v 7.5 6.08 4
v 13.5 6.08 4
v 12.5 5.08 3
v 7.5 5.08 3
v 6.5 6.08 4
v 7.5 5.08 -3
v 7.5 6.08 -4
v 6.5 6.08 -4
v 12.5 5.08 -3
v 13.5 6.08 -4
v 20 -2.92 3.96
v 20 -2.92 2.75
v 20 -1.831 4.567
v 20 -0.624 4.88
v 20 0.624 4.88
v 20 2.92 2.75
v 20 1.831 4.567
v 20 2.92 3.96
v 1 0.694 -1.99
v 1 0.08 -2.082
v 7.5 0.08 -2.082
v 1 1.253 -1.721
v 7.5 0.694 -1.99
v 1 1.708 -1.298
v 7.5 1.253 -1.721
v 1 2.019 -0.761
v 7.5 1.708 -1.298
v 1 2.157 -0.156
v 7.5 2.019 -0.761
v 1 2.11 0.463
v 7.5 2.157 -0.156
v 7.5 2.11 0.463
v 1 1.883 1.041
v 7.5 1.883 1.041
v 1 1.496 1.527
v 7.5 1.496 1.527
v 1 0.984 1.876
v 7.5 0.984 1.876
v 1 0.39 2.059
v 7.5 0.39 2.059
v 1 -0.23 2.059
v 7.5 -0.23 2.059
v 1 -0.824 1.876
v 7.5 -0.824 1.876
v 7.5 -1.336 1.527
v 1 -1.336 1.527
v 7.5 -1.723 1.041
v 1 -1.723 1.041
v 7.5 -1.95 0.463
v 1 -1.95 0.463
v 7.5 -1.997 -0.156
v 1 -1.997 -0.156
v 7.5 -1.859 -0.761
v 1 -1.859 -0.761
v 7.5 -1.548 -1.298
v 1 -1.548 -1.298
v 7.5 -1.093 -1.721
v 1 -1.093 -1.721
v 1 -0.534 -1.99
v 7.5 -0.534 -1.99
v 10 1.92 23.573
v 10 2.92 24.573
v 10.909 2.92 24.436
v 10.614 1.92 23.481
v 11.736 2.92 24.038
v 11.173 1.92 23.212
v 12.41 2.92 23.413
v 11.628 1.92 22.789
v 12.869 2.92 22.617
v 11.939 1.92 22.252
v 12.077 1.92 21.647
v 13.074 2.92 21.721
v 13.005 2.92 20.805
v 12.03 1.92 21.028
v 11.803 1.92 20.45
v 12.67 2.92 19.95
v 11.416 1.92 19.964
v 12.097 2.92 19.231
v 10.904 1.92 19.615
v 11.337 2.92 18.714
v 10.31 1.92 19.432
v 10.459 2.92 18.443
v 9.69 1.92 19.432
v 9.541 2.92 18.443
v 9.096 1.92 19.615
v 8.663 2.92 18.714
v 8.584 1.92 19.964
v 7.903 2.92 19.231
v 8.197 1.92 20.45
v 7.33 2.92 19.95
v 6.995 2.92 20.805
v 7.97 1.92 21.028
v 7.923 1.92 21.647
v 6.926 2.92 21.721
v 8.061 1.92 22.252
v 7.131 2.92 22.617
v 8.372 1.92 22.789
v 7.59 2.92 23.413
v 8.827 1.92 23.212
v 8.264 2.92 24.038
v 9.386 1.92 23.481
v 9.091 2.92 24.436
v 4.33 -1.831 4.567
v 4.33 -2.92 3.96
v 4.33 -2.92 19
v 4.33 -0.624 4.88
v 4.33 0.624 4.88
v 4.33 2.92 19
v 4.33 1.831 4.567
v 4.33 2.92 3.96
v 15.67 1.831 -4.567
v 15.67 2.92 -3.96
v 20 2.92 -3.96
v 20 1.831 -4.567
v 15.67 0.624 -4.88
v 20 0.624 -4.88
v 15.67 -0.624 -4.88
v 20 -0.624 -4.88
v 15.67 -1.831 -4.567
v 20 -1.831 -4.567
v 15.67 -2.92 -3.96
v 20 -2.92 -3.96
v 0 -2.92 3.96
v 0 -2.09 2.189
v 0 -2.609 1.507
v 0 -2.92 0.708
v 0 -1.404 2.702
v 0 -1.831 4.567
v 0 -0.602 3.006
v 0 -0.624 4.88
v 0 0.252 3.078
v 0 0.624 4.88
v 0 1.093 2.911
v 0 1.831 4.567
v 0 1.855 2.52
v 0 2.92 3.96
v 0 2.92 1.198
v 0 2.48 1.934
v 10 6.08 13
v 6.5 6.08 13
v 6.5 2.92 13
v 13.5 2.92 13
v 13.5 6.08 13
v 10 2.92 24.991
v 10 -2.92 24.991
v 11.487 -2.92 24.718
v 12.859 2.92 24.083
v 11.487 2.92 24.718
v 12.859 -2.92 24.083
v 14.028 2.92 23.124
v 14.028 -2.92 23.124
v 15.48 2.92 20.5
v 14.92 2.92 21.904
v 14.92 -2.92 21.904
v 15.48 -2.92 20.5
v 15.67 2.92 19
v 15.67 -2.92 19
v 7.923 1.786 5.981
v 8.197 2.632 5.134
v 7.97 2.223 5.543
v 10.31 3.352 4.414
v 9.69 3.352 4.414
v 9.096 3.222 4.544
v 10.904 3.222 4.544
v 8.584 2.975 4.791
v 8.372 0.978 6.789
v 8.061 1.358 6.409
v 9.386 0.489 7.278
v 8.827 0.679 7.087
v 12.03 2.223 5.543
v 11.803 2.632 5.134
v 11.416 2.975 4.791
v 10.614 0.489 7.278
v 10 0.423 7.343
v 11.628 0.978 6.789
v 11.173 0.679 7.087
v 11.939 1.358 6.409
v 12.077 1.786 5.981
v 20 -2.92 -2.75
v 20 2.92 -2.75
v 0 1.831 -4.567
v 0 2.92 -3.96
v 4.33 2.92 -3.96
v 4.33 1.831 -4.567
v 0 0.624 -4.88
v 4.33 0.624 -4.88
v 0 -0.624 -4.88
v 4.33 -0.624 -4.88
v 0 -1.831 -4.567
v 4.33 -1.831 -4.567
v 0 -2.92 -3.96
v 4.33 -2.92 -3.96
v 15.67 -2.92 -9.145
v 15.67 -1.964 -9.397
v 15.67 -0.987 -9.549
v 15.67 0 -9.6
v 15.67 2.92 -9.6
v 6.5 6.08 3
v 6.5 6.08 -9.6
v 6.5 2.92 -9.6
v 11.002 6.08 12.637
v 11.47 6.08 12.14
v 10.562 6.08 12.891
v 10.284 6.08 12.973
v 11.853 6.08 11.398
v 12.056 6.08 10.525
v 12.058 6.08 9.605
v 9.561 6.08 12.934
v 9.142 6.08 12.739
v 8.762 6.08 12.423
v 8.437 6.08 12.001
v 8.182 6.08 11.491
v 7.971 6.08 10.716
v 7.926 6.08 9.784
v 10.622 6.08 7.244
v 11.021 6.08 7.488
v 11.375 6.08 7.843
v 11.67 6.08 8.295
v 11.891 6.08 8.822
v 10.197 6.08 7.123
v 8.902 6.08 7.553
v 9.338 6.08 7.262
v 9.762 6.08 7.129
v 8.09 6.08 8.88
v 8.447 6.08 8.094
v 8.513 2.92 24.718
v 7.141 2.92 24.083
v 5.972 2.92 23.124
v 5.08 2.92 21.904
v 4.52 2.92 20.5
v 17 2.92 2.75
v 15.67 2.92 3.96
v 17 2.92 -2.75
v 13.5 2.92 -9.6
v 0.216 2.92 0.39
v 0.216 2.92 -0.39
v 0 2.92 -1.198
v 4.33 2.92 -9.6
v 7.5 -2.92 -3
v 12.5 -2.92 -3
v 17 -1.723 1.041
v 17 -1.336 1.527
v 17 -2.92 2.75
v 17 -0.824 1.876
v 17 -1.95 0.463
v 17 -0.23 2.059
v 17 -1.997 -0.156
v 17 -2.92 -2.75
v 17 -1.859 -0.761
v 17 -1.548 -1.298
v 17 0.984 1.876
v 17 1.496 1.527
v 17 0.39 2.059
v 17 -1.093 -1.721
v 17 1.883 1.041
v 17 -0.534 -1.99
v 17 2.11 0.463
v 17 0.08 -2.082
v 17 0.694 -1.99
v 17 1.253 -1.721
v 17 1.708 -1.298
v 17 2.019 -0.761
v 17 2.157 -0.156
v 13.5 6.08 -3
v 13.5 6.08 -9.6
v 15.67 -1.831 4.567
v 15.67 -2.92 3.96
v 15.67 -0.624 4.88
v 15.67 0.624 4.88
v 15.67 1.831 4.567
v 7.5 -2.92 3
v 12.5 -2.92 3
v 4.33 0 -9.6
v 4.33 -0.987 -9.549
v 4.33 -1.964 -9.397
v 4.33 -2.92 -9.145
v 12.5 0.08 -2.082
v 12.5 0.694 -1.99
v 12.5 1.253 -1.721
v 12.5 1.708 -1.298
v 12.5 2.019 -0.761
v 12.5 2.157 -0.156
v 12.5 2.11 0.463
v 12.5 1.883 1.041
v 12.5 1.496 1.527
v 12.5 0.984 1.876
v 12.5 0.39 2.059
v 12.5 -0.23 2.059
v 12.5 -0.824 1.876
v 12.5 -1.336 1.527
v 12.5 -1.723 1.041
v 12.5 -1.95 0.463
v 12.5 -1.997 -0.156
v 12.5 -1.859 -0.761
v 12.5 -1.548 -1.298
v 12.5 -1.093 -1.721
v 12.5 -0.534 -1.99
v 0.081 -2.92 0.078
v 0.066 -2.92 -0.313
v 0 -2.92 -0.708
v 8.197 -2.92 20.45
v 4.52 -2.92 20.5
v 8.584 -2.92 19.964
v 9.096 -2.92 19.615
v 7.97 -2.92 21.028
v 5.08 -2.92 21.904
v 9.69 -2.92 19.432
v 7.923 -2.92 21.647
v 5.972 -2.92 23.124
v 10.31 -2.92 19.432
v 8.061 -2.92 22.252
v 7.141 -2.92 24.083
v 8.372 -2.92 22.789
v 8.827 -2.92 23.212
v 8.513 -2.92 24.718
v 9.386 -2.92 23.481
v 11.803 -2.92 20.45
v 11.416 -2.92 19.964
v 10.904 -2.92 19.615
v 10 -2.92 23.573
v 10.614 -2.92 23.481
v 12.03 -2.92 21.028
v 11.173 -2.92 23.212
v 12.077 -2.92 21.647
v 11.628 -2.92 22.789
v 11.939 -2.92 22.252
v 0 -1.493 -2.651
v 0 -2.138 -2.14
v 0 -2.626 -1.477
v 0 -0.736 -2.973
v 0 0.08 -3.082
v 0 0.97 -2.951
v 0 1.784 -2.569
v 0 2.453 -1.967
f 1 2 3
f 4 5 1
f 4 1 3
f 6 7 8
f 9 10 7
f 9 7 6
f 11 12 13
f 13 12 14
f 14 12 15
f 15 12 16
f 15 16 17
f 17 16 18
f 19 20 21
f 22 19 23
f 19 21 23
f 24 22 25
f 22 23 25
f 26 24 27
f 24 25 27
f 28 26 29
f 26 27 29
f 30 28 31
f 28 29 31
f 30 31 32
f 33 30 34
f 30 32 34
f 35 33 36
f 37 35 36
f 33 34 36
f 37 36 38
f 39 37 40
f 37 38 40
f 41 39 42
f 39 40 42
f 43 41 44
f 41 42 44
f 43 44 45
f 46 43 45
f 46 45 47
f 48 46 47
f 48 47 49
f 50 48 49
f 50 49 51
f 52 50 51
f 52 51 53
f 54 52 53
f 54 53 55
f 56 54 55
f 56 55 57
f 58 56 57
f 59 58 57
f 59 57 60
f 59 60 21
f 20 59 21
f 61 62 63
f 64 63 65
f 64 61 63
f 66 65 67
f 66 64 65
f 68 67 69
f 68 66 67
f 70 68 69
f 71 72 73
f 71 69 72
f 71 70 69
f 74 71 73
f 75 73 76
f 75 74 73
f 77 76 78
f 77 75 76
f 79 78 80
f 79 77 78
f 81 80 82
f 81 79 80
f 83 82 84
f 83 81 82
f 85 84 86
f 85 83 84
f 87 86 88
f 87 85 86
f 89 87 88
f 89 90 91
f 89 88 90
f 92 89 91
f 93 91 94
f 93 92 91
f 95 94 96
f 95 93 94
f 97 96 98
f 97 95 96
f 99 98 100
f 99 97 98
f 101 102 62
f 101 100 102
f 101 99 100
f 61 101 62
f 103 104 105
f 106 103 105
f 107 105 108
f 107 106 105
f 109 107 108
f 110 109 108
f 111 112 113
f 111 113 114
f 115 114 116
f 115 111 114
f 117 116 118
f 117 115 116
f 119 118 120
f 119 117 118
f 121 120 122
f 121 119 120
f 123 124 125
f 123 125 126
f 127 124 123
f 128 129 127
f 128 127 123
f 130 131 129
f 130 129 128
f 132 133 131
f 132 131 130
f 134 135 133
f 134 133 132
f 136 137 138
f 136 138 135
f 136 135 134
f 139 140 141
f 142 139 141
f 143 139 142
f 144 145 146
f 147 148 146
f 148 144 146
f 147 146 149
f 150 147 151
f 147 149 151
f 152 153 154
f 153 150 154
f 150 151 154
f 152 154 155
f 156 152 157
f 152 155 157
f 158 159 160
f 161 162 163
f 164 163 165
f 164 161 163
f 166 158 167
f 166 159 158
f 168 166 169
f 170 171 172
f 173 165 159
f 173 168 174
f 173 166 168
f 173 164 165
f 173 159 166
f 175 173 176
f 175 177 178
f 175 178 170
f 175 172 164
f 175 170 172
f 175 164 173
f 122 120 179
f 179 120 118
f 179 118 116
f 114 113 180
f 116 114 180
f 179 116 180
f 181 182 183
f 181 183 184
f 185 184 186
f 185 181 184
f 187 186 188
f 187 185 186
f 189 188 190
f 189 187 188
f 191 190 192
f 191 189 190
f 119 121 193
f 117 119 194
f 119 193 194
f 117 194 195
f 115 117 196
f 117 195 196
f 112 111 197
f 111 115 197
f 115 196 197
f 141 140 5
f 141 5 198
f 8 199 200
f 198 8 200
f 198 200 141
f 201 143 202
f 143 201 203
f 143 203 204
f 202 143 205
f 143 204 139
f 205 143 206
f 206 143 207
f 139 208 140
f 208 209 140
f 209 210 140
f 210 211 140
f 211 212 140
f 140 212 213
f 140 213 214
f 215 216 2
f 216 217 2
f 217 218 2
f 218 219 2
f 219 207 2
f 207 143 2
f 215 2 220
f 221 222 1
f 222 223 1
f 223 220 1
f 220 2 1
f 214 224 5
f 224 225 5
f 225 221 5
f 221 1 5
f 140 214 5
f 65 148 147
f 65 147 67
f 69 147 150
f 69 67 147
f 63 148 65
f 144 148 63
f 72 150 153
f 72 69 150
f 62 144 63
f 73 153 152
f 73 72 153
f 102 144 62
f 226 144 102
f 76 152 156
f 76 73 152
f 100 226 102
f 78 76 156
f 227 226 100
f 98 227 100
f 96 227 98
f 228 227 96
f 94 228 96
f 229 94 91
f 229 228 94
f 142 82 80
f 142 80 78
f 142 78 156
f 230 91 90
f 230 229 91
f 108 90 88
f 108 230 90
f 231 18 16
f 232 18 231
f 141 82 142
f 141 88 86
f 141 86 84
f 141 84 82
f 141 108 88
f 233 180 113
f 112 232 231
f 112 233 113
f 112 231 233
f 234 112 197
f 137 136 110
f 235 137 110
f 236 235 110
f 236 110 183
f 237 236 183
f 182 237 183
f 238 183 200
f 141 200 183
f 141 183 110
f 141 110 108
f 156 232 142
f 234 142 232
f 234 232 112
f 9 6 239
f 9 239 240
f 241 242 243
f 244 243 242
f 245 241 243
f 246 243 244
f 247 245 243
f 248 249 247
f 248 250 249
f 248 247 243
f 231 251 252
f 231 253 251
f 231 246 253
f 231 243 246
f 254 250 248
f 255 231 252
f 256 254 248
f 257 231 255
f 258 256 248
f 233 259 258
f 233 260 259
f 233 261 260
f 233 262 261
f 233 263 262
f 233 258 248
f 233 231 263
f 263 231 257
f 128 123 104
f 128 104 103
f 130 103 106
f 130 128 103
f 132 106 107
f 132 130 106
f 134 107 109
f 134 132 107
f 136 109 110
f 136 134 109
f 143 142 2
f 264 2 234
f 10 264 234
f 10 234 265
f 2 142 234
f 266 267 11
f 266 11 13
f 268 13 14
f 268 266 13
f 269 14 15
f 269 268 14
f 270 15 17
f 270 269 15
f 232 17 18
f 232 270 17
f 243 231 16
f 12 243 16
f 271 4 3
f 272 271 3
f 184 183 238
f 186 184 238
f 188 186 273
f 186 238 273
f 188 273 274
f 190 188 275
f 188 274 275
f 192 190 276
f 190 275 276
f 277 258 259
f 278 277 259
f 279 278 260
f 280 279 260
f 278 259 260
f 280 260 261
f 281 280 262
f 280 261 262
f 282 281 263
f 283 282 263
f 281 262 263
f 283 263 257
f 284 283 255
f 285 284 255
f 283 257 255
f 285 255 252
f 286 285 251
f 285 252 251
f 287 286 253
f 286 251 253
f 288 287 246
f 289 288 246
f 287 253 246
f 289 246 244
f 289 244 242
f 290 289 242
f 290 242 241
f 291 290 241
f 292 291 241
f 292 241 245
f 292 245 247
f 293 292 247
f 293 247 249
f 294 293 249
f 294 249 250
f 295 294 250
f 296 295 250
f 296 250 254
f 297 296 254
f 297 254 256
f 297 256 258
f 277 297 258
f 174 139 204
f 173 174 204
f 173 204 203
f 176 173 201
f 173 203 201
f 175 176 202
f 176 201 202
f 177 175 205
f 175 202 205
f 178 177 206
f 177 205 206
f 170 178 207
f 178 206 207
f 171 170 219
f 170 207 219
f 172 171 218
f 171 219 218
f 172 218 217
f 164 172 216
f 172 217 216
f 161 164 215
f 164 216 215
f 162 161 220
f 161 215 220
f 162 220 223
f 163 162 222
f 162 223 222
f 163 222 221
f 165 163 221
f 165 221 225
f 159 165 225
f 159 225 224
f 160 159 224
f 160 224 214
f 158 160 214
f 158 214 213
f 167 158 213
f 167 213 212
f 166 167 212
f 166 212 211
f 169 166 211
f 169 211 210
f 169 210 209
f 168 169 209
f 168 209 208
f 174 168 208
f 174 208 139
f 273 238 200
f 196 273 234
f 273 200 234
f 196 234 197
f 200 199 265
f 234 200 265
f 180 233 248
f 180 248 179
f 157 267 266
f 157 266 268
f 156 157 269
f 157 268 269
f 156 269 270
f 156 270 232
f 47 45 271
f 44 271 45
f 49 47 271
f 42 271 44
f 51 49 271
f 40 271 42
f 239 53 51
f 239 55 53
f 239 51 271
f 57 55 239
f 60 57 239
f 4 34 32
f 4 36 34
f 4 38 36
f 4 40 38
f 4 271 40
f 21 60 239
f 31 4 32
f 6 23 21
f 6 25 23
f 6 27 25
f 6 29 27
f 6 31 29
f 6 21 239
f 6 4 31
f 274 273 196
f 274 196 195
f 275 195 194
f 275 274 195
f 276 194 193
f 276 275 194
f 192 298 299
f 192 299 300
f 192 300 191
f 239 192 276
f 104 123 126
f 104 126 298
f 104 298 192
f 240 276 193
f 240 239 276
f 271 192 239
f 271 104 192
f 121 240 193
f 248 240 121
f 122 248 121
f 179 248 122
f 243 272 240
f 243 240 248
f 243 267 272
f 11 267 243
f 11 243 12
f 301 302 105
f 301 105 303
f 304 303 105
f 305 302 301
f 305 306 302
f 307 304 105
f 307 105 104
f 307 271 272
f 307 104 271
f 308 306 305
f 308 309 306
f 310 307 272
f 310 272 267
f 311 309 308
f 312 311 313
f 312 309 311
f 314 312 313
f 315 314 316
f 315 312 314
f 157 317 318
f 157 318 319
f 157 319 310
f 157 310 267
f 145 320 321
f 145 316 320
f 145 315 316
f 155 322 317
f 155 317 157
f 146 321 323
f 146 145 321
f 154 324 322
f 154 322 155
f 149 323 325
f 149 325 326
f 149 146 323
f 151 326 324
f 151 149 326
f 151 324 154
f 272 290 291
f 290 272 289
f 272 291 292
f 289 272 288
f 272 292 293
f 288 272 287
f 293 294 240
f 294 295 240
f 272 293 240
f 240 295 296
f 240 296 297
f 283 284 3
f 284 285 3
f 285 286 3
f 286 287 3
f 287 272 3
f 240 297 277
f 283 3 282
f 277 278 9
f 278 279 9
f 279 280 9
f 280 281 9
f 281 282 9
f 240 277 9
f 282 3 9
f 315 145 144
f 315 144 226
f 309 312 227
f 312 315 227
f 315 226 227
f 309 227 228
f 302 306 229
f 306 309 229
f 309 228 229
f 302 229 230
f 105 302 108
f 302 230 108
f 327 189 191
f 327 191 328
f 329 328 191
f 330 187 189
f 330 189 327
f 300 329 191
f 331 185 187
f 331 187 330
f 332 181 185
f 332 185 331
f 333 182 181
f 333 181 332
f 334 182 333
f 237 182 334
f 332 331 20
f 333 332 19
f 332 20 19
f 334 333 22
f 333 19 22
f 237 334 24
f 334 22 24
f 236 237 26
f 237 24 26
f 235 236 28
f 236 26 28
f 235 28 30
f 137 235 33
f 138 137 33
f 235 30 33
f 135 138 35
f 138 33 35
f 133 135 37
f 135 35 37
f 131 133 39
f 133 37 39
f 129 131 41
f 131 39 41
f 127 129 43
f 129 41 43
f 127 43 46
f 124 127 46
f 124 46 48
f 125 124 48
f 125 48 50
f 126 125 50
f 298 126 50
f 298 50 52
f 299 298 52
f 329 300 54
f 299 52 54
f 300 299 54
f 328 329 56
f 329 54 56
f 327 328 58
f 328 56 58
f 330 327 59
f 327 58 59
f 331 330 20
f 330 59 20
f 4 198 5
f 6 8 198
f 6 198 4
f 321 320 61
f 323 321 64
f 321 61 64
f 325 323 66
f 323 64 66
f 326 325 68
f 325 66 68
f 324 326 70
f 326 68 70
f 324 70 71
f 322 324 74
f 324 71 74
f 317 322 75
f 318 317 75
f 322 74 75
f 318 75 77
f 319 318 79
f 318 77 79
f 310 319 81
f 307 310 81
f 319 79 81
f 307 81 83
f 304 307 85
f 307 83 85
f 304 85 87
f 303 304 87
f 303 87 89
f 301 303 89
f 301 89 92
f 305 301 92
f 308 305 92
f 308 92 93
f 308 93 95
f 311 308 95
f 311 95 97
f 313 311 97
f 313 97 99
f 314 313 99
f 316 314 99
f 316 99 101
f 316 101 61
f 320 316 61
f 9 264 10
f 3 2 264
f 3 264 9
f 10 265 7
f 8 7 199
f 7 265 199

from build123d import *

# Parameters (mm, degrees)
BOSS_EXTRUDE1_DEPTH      = 20
SKETCH3_W                = 11.34
SKETCH3_H                = 5.84
BOSS_EXTRUDE2_DEPTH      = 25
FILLET1_R                = 6
SKETCH4_W                = 7
SKETCH4_H                = 8
BOSS_EXTRUDE3_DEPTH      = 9
BOSS_EXTRUDE4_DEPTH      = 13
BOSS_EXTRUDE4_DEPTH_BACK = 9.6
SKETCH5_W                = 5
SKETCH5_H                = 6
CUT_EXTRUDE1_DEPTH       = 9
SKETCH6_R                = 2.0825
CUT_EXTRUDE2_DEPTH       = 5.84
CUT_EXTRUDE3_REACH       = 34.581
SKETCH8_R                = 2.0825
SKETCH9_W                = 3
SKETCH9_H                = 5.5
CUT_EXTRUDE4_DEPTH       = 5.84
CUT_EXTRUDE5_DEPTH       = 11.34
SKETCH13_R               = 2.0825
CUT_EXTRUDE7_DEPTH       = 8


with BuildPart() as part:
    # Sketch2 → Boss-Extrude1 (new body)
    with BuildSketch(Plane(origin=(0, 0, 0), x_dir=(0, 0, -1), z_dir=(1, 0, 0))):
        with BuildLine():
            ThreePointArc((3.959797975, 2.92), (4.92, 0), (3.959797975, -2.92))
            Line((3.959797975, -2.92), (-3.959797975, -2.92))
            ThreePointArc((-3.959797975, -2.92), (-4.92, 0), (-3.959797975, 2.92))
            Line((-3.959797975, 2.92), (3.959797975, 2.92))
        make_face()
    extrude(amount=BOSS_EXTRUDE1_DEPTH)

    # Sketch3 → Boss-Extrude2 (add)
    with BuildSketch(Plane.XY):
        with Locations((10, 0)):
            Rectangle(SKETCH3_W, SKETCH3_H)
    extrude(amount=BOSS_EXTRUDE2_DEPTH)

    # Fillet1
    # the kernel refuses this fillet: 6 mm, written as the material it takes off along each edge
    with BuildSketch(Plane(origin=(15.67, -17.92, 25), x_dir=(0, 0, -1), z_dir=(0, 1, 0)), Plane(origin=(4.33, 17.92, 25), x_dir=(0, 0, -1), z_dir=(0, -1, 0))) as fillet1_piece_1:
        with BuildLine():
            CenterArc((FILLET1_R, FILLET1_R), FILLET1_R, 180, 90)
            Line((0, FILLET1_R), (0, 0))
            Line((0, 0), (FILLET1_R, 0))
        make_face()
    extrude(amount=35.84, mode=Mode.SUBTRACT)

    # Sketch4 → Boss-Extrude3 (add)
    with BuildSketch(Plane.XZ.offset(2.92)):
        with Locations((10, 0.040202025)):
            Rectangle(SKETCH4_W, SKETCH4_H)
    extrude(amount=-BOSS_EXTRUDE3_DEPTH)

    # Sketch10 → Boss-Extrude4 (add, two sides: drawn at the far end of the back side and taken through both)
    with BuildSketch(Plane.XY.offset(-BOSS_EXTRUDE4_DEPTH_BACK)):
        Polygon((10, -2.92), (15.67, -2.92), (15.67, 2.92), (13.5, 2.92), (13.5, 6.08), (6.5, 6.08), (6.5, 2.92), (4.33, 2.92), (4.33, -2.92), align=None)
    extrude(amount=BOSS_EXTRUDE4_DEPTH + BOSS_EXTRUDE4_DEPTH_BACK)

    # Sketch5 → Cut-Extrude1 (cut)
    with BuildSketch(Plane(origin=(0, 6.08, 0), x_dir=(1, 0, 0), z_dir=(0, 1, 0))):
        with Locations((10, 0)):
            Rectangle(SKETCH5_W, SKETCH5_H)
    extrude(amount=-CUT_EXTRUDE1_DEPTH, mode=Mode.SUBTRACT)

    # Sketch6 → Cut-Extrude2 (cut)
    with BuildSketch(Plane(origin=(0, 2.92, 0), x_dir=(1, 0, 0), z_dir=(0, 1, 0))):
        with Locations(Location((10, -21.490918127, 0), (0, 0, 270))):
            Circle(SKETCH6_R)
    extrude(amount=-CUT_EXTRUDE2_DEPTH, mode=Mode.SUBTRACT)

    # Cut-Extrude3: up to this face of the body (flat: up to its plane)
    cut_extrude3_end = Plane(part.part.faces().sort_by_distance((0, 0, 0))[0])
    # Sketch8 → Cut-Extrude3 (cut, up to the picked face)
    with BuildSketch(Plane(origin=(20, 0, 0), x_dir=(0, 0, -1), z_dir=(1, 0, 0)), mode=Mode.PRIVATE) as cut_extrude3_sk1:
        with Locations((0, 0.08)):
            Circle(SKETCH8_R)
    cut_extrude3_tool1 = split(extrude(cut_extrude3_sk1.sketch, amount=-CUT_EXTRUDE3_REACH, mode=Mode.PRIVATE), bisect_by=cut_extrude3_end, keep=Keep.BOTH, mode=Mode.PRIVATE)
    add(cut_extrude3_tool1.solids().sort_by(Axis((20, 0.08, 0), (-1, 0, 0)))[0], mode=Mode.SUBTRACT)

    # Sketch9 → Cut-Extrude4 (cut)
    with BuildSketch(Plane(origin=(0, 2.92, 0), x_dir=(1, 0, 0), z_dir=(0, 1, 0))):
        with Locations((18.5, 0)):
            Rectangle(SKETCH9_W, SKETCH9_H)
    extrude(amount=-CUT_EXTRUDE4_DEPTH, mode=Mode.SUBTRACT)

    # Chamfer1
    # the kernel refuses this chamfer: 1 mm, written as the material it takes off along each edge
    with BuildSketch(Plane(origin=(12.5, 6.08, 3), x_dir=(0.9996219169112968, 0.027495876610587375, 0), z_dir=(0, 0, -1)), Plane(origin=(7.5, 6.08, -3), x_dir=(-0.9996219169112968, 0.02749587661058735, 0), z_dir=(0, 0, 1))) as chamfer1_piece_1:
        with BuildLine():
            Line((1.028673195, 0), (-0.056547155, 1.027117794))
            Line((-0.056547155, 1.027117794), (-0.076539593, 1.026567876))
            ThreePointArc((-0.076539593, 1.026567876), (-0.034129227, 0.51339783), (-0.019992438, -0.000549918))
            Line((-0.019992438, -0.000549918), (0.000549918, -0.019992438))
            ThreePointArc((0.000549918, -0.019992438), (0.514497665, -0.00585565), (1.029223113, -0.019992438))
            Line((1.029223113, -0.019992438), (1.028673195, 0))
        make_face()
    extrude(amount=6, mode=Mode.SUBTRACT)
    with BuildSketch(Plane(origin=(12.5, 6.08, -3), x_dir=(0, 0.02749587661058736, -0.9996219169112968), z_dir=(-1, 0, 0)), Plane(origin=(7.5, 6.08, 3), x_dir=(0, 0.02749587661058736, 0.9996219169112968), z_dir=(1, 0, 0))) as chamfer1_piece_2:
        with BuildLine():
            Line((1.028673195, 0), (-0.056547155, 1.027117794))
            Line((-0.056547155, 1.027117794), (-0.076539593, 1.026567876))
            ThreePointArc((-0.076539593, 1.026567876), (-0.034129227, 0.51339783), (-0.019992438, -0.000549918))
            Line((-0.019992438, -0.000549918), (0.000549918, -0.019992438))
            ThreePointArc((0.000549918, -0.019992438), (0.514497665, -0.00585565), (1.029223113, -0.019992438))
            Line((1.029223113, -0.019992438), (1.028673195, 0))
        make_face()
    extrude(amount=5, mode=Mode.SUBTRACT)
    with BuildSketch(Plane(origin=(10, 2.92, 21.490918127), x_dir=(0, 0, 1), z_dir=(-1, 0, 0))) as chamfer1_piece_3:
        with BuildLine():
            Line((3.110784271, 0.028284271), (2.054215729, -1.028284271))
            Line((2.054215729, -1.028284271), (2.034215729, -1.028284271))
            ThreePointArc((2.034215729, -1.028284271), (2.0625, -0.514142136), (2.0625, 0))
            Line((2.0625, 0), (2.0825, 0.02))
            ThreePointArc((2.0825, 0.02), (2.596642136, 0.02), (3.110784271, 0.048284271))
            Line((3.110784271, 0.048284271), (3.110784271, 0.028284271))
        make_face()
    revolve(axis=Axis((10, 2.92, 21.490918127), (0, 1, 0)), mode=Mode.SUBTRACT)
    with BuildSketch(Plane(origin=(0, 0.08, 0), x_dir=(0, 0, -1), z_dir=(0, -1, 0))) as chamfer1_piece_4:
        with BuildLine():
            Line((3.110784271, -0.028284271), (2.054215729, 1.028284271))
            Line((2.054215729, 1.028284271), (2.034215729, 1.028284271))
            ThreePointArc((2.034215729, 1.028284271), (2.0625, 0.514142136), (2.0625, 0))
            Line((2.0625, 0), (2.0825, -0.02))
            ThreePointArc((2.0825, -0.02), (2.596642136, -0.02), (3.110784271, -0.048284271))
            Line((3.110784271, -0.048284271), (3.110784271, -0.028284271))
        make_face()
    revolve(axis=Axis((0, 0.08, 0), (1, 0, 0)), mode=Mode.SUBTRACT)
    with BuildSketch(Plane(origin=(12.5, 6.08, 5.571682988), x_dir=(0.9996219169112968, 0.02749587661058651, 0), z_dir=(0, 0, -1))) as chamfer1_piece_5a_section:
        with BuildLine():
            Line((1.028673195, 0), (-0.056547155, 1.027117794))
            Line((-0.056547155, 1.027117794), (-0.076539593, 1.026567876))
            ThreePointArc((-0.076539593, 1.026567876), (-0.034129227, 0.51339783), (-0.019992438, -0.000549918))
            Line((-0.019992438, -0.000549918), (0.000549918, -0.019992438))
            ThreePointArc((0.000549918, -0.019992438), (0.514497665, -0.00585565), (1.029223113, -0.019992438))
            Line((1.029223113, -0.019992438), (1.028673195, 0))
        make_face()
    chamfer1_piece_5a = extrude(amount=8.571682988, mode=Mode.PRIVATE)
    chamfer1_piece_5a = split(chamfer1_piece_5a, bisect_by=Plane(origin=(12.829793627, 5.750206373, 3), z_dir=(0, 0, 1)), keep=Keep.TOP, mode=Mode.PRIVATE)
    with BuildSketch(Plane(origin=(7.5, 6.08, 3), x_dir=(0, 0.02749587661058736, 0.9996219169112968), z_dir=(1, 0, 0))) as chamfer1_piece_5b_section:
        with BuildLine():
            Line((1.028673195, 0), (-0.056547155, 1.027117794))
            Line((-0.056547155, 1.027117794), (-0.076539593, 1.026567876))
            ThreePointArc((-0.076539593, 1.026567876), (-0.034129227, 0.51339783), (-0.019992438, -0.000549918))
            Line((-0.019992438, -0.000549918), (0.000549918, -0.019992438))
            ThreePointArc((0.000549918, -0.019992438), (0.514497665, -0.00585565), (1.029223113, -0.019992438))
            Line((1.029223113, -0.019992438), (1.028673195, 0))
        make_face()
    chamfer1_piece_5b = extrude(amount=7.571682988, mode=Mode.PRIVATE)
    chamfer1_piece_5b = split(chamfer1_piece_5b, bisect_by=Plane(origin=(12.5, 5.750206373, 3.329793627), z_dir=(1, 0, 0)), keep=Keep.TOP, mode=Mode.PRIVATE)
    chamfer1_piece_5 = chamfer1_piece_5a & chamfer1_piece_5b
    add(chamfer1_piece_5, mode=Mode.SUBTRACT)
    with BuildSketch(Plane(origin=(15.071682988, 6.08, -3), x_dir=(0, 0.027495876610586497, -0.9996219169112968), z_dir=(-1, 0, 0))) as chamfer1_piece_6a_section:
        with BuildLine():
            Line((1.028673195, 0), (-0.056547155, 1.027117794))
            Line((-0.056547155, 1.027117794), (-0.076539593, 1.026567876))
            ThreePointArc((-0.076539593, 1.026567876), (-0.034129227, 0.51339783), (-0.019992438, -0.000549918))
            Line((-0.019992438, -0.000549918), (0.000549918, -0.019992438))
            ThreePointArc((0.000549918, -0.019992438), (0.514497665, -0.00585565), (1.029223113, -0.019992438))
            Line((1.029223113, -0.019992438), (1.028673195, 0))
        make_face()
    chamfer1_piece_6a = extrude(amount=7.571682988, mode=Mode.PRIVATE)
    chamfer1_piece_6a = split(chamfer1_piece_6a, bisect_by=Plane(origin=(12.5, 5.750206373, -3.329793627), z_dir=(1, 0, 0)), keep=Keep.TOP, mode=Mode.PRIVATE)
    with BuildSketch(Plane(origin=(12.5, 6.08, 3), x_dir=(0.9996219169112968, 0.027495876610587375, 0), z_dir=(0, 0, -1))) as chamfer1_piece_6b_section:
        with BuildLine():
            Line((1.028673195, 0), (-0.056547155, 1.027117794))
            Line((-0.056547155, 1.027117794), (-0.076539593, 1.026567876))
            ThreePointArc((-0.076539593, 1.026567876), (-0.034129227, 0.51339783), (-0.019992438, -0.000549918))
            Line((-0.019992438, -0.000549918), (0.000549918, -0.019992438))
            ThreePointArc((0.000549918, -0.019992438), (0.514497665, -0.00585565), (1.029223113, -0.019992438))
            Line((1.029223113, -0.019992438), (1.028673195, 0))
        make_face()
    chamfer1_piece_6b = extrude(amount=8.571682988, mode=Mode.PRIVATE)
    chamfer1_piece_6b = split(chamfer1_piece_6b, bisect_by=Plane(origin=(12.829793627, 5.750206373, -3), z_dir=(0, 0, -1)), keep=Keep.TOP, mode=Mode.PRIVATE)
    chamfer1_piece_6 = chamfer1_piece_6a & chamfer1_piece_6b
    add(chamfer1_piece_6, mode=Mode.SUBTRACT)
    with BuildSketch(Plane(origin=(7.5, 6.08, -5.571682988), x_dir=(-0.9996219169112968, 0.027495876610586487, 0), z_dir=(0, 0, 1))) as chamfer1_piece_7a_section:
        with BuildLine():
            Line((1.028673195, 0), (-0.056547155, 1.027117794))
            Line((-0.056547155, 1.027117794), (-0.076539593, 1.026567876))
            ThreePointArc((-0.076539593, 1.026567876), (-0.034129227, 0.51339783), (-0.019992438, -0.000549918))
            Line((-0.019992438, -0.000549918), (0.000549918, -0.019992438))
            ThreePointArc((0.000549918, -0.019992438), (0.514497665, -0.00585565), (1.029223113, -0.019992438))
            Line((1.029223113, -0.019992438), (1.028673195, 0))
        make_face()
    chamfer1_piece_7a = extrude(amount=8.571682988, mode=Mode.PRIVATE)
    chamfer1_piece_7a = split(chamfer1_piece_7a, bisect_by=Plane(origin=(7.170206373, 5.750206373, -3), z_dir=(0, 0, -1)), keep=Keep.TOP, mode=Mode.PRIVATE)
    with BuildSketch(Plane(origin=(12.5, 6.08, -3), x_dir=(0, 0.02749587661058736, -0.9996219169112968), z_dir=(-1, 0, 0))) as chamfer1_piece_7b_section:
        with BuildLine():
            Line((1.028673195, 0), (-0.056547155, 1.027117794))
            Line((-0.056547155, 1.027117794), (-0.076539593, 1.026567876))
            ThreePointArc((-0.076539593, 1.026567876), (-0.034129227, 0.51339783), (-0.019992438, -0.000549918))
            Line((-0.019992438, -0.000549918), (0.000549918, -0.019992438))
            ThreePointArc((0.000549918, -0.019992438), (0.514497665, -0.00585565), (1.029223113, -0.019992438))
            Line((1.029223113, -0.019992438), (1.028673195, 0))
        make_face()
    chamfer1_piece_7b = extrude(amount=7.571682988, mode=Mode.PRIVATE)
    chamfer1_piece_7b = split(chamfer1_piece_7b, bisect_by=Plane(origin=(7.5, 5.750206373, -3.329793627), z_dir=(-1, 0, 0)), keep=Keep.TOP, mode=Mode.PRIVATE)
    chamfer1_piece_7 = chamfer1_piece_7a & chamfer1_piece_7b
    add(chamfer1_piece_7, mode=Mode.SUBTRACT)
    with BuildSketch(Plane(origin=(7.5, 6.08, -3), x_dir=(-0.9996219169112968, 0.02749587661058735, 0), z_dir=(0, 0, 1))) as chamfer1_piece_8a_section:
        with BuildLine():
            Line((1.028673195, 0), (-0.056547155, 1.027117794))
            Line((-0.056547155, 1.027117794), (-0.076539593, 1.026567876))
            ThreePointArc((-0.076539593, 1.026567876), (-0.034129227, 0.51339783), (-0.019992438, -0.000549918))
            Line((-0.019992438, -0.000549918), (0.000549918, -0.019992438))
            ThreePointArc((0.000549918, -0.019992438), (0.514497665, -0.00585565), (1.029223113, -0.019992438))
            Line((1.029223113, -0.019992438), (1.028673195, 0))
        make_face()
    chamfer1_piece_8a = extrude(amount=8.571682988, mode=Mode.PRIVATE)
    chamfer1_piece_8a = split(chamfer1_piece_8a, bisect_by=Plane(origin=(7.170206373, 5.750206373, 3), z_dir=(0, 0, 1)), keep=Keep.TOP, mode=Mode.PRIVATE)
    with BuildSketch(Plane(origin=(4.928317012, 6.08, 3), x_dir=(0, 0.027495876610586497, 0.9996219169112968), z_dir=(1, 0, 0))) as chamfer1_piece_8b_section:
        with BuildLine():
            Line((1.028673195, 0), (-0.056547155, 1.027117794))
            Line((-0.056547155, 1.027117794), (-0.076539593, 1.026567876))
            ThreePointArc((-0.076539593, 1.026567876), (-0.034129227, 0.51339783), (-0.019992438, -0.000549918))
            Line((-0.019992438, -0.000549918), (0.000549918, -0.019992438))
            ThreePointArc((0.000549918, -0.019992438), (0.514497665, -0.00585565), (1.029223113, -0.019992438))
            Line((1.029223113, -0.019992438), (1.028673195, 0))
        make_face()
    chamfer1_piece_8b = extrude(amount=7.571682988, mode=Mode.PRIVATE)
    chamfer1_piece_8b = split(chamfer1_piece_8b, bisect_by=Plane(origin=(7.5, 5.750206373, 3.329793627), z_dir=(-1, 0, 0)), keep=Keep.TOP, mode=Mode.PRIVATE)
    chamfer1_piece_8 = chamfer1_piece_8a & chamfer1_piece_8b
    add(chamfer1_piece_8, mode=Mode.SUBTRACT)

    # Sketch11 → Cut-Extrude5 (cut)
    with BuildSketch(Plane.ZY.offset(-4.33)):
        with BuildLine():
            Line((-9.145140786, -2.92), (-9.6, -2.92))
            Line((-9.6, -2.92), (-9.6, 0))
            ThreePointArc((-9.6, 0), (-9.485603606, -1.477607602), (-9.145140786, -2.92))
        make_face()
    extrude(amount=-CUT_EXTRUDE5_DEPTH, mode=Mode.SUBTRACT)

    # Sketch13 → Cut-Extrude7 (cut)
    with BuildSketch(Plane(origin=(0, 9.54, 9.54), x_dir=(-1, 0, 0), z_dir=(0, 0.7071067811865464, 0.7071067811865488))):
        with Locations(Location((-10, 2.810678926, 0), (0, 0, 90))):
            Circle(SKETCH13_R)
    extrude(amount=-CUT_EXTRUDE7_DEPTH, mode=Mode.SUBTRACT)


solid = part.part
